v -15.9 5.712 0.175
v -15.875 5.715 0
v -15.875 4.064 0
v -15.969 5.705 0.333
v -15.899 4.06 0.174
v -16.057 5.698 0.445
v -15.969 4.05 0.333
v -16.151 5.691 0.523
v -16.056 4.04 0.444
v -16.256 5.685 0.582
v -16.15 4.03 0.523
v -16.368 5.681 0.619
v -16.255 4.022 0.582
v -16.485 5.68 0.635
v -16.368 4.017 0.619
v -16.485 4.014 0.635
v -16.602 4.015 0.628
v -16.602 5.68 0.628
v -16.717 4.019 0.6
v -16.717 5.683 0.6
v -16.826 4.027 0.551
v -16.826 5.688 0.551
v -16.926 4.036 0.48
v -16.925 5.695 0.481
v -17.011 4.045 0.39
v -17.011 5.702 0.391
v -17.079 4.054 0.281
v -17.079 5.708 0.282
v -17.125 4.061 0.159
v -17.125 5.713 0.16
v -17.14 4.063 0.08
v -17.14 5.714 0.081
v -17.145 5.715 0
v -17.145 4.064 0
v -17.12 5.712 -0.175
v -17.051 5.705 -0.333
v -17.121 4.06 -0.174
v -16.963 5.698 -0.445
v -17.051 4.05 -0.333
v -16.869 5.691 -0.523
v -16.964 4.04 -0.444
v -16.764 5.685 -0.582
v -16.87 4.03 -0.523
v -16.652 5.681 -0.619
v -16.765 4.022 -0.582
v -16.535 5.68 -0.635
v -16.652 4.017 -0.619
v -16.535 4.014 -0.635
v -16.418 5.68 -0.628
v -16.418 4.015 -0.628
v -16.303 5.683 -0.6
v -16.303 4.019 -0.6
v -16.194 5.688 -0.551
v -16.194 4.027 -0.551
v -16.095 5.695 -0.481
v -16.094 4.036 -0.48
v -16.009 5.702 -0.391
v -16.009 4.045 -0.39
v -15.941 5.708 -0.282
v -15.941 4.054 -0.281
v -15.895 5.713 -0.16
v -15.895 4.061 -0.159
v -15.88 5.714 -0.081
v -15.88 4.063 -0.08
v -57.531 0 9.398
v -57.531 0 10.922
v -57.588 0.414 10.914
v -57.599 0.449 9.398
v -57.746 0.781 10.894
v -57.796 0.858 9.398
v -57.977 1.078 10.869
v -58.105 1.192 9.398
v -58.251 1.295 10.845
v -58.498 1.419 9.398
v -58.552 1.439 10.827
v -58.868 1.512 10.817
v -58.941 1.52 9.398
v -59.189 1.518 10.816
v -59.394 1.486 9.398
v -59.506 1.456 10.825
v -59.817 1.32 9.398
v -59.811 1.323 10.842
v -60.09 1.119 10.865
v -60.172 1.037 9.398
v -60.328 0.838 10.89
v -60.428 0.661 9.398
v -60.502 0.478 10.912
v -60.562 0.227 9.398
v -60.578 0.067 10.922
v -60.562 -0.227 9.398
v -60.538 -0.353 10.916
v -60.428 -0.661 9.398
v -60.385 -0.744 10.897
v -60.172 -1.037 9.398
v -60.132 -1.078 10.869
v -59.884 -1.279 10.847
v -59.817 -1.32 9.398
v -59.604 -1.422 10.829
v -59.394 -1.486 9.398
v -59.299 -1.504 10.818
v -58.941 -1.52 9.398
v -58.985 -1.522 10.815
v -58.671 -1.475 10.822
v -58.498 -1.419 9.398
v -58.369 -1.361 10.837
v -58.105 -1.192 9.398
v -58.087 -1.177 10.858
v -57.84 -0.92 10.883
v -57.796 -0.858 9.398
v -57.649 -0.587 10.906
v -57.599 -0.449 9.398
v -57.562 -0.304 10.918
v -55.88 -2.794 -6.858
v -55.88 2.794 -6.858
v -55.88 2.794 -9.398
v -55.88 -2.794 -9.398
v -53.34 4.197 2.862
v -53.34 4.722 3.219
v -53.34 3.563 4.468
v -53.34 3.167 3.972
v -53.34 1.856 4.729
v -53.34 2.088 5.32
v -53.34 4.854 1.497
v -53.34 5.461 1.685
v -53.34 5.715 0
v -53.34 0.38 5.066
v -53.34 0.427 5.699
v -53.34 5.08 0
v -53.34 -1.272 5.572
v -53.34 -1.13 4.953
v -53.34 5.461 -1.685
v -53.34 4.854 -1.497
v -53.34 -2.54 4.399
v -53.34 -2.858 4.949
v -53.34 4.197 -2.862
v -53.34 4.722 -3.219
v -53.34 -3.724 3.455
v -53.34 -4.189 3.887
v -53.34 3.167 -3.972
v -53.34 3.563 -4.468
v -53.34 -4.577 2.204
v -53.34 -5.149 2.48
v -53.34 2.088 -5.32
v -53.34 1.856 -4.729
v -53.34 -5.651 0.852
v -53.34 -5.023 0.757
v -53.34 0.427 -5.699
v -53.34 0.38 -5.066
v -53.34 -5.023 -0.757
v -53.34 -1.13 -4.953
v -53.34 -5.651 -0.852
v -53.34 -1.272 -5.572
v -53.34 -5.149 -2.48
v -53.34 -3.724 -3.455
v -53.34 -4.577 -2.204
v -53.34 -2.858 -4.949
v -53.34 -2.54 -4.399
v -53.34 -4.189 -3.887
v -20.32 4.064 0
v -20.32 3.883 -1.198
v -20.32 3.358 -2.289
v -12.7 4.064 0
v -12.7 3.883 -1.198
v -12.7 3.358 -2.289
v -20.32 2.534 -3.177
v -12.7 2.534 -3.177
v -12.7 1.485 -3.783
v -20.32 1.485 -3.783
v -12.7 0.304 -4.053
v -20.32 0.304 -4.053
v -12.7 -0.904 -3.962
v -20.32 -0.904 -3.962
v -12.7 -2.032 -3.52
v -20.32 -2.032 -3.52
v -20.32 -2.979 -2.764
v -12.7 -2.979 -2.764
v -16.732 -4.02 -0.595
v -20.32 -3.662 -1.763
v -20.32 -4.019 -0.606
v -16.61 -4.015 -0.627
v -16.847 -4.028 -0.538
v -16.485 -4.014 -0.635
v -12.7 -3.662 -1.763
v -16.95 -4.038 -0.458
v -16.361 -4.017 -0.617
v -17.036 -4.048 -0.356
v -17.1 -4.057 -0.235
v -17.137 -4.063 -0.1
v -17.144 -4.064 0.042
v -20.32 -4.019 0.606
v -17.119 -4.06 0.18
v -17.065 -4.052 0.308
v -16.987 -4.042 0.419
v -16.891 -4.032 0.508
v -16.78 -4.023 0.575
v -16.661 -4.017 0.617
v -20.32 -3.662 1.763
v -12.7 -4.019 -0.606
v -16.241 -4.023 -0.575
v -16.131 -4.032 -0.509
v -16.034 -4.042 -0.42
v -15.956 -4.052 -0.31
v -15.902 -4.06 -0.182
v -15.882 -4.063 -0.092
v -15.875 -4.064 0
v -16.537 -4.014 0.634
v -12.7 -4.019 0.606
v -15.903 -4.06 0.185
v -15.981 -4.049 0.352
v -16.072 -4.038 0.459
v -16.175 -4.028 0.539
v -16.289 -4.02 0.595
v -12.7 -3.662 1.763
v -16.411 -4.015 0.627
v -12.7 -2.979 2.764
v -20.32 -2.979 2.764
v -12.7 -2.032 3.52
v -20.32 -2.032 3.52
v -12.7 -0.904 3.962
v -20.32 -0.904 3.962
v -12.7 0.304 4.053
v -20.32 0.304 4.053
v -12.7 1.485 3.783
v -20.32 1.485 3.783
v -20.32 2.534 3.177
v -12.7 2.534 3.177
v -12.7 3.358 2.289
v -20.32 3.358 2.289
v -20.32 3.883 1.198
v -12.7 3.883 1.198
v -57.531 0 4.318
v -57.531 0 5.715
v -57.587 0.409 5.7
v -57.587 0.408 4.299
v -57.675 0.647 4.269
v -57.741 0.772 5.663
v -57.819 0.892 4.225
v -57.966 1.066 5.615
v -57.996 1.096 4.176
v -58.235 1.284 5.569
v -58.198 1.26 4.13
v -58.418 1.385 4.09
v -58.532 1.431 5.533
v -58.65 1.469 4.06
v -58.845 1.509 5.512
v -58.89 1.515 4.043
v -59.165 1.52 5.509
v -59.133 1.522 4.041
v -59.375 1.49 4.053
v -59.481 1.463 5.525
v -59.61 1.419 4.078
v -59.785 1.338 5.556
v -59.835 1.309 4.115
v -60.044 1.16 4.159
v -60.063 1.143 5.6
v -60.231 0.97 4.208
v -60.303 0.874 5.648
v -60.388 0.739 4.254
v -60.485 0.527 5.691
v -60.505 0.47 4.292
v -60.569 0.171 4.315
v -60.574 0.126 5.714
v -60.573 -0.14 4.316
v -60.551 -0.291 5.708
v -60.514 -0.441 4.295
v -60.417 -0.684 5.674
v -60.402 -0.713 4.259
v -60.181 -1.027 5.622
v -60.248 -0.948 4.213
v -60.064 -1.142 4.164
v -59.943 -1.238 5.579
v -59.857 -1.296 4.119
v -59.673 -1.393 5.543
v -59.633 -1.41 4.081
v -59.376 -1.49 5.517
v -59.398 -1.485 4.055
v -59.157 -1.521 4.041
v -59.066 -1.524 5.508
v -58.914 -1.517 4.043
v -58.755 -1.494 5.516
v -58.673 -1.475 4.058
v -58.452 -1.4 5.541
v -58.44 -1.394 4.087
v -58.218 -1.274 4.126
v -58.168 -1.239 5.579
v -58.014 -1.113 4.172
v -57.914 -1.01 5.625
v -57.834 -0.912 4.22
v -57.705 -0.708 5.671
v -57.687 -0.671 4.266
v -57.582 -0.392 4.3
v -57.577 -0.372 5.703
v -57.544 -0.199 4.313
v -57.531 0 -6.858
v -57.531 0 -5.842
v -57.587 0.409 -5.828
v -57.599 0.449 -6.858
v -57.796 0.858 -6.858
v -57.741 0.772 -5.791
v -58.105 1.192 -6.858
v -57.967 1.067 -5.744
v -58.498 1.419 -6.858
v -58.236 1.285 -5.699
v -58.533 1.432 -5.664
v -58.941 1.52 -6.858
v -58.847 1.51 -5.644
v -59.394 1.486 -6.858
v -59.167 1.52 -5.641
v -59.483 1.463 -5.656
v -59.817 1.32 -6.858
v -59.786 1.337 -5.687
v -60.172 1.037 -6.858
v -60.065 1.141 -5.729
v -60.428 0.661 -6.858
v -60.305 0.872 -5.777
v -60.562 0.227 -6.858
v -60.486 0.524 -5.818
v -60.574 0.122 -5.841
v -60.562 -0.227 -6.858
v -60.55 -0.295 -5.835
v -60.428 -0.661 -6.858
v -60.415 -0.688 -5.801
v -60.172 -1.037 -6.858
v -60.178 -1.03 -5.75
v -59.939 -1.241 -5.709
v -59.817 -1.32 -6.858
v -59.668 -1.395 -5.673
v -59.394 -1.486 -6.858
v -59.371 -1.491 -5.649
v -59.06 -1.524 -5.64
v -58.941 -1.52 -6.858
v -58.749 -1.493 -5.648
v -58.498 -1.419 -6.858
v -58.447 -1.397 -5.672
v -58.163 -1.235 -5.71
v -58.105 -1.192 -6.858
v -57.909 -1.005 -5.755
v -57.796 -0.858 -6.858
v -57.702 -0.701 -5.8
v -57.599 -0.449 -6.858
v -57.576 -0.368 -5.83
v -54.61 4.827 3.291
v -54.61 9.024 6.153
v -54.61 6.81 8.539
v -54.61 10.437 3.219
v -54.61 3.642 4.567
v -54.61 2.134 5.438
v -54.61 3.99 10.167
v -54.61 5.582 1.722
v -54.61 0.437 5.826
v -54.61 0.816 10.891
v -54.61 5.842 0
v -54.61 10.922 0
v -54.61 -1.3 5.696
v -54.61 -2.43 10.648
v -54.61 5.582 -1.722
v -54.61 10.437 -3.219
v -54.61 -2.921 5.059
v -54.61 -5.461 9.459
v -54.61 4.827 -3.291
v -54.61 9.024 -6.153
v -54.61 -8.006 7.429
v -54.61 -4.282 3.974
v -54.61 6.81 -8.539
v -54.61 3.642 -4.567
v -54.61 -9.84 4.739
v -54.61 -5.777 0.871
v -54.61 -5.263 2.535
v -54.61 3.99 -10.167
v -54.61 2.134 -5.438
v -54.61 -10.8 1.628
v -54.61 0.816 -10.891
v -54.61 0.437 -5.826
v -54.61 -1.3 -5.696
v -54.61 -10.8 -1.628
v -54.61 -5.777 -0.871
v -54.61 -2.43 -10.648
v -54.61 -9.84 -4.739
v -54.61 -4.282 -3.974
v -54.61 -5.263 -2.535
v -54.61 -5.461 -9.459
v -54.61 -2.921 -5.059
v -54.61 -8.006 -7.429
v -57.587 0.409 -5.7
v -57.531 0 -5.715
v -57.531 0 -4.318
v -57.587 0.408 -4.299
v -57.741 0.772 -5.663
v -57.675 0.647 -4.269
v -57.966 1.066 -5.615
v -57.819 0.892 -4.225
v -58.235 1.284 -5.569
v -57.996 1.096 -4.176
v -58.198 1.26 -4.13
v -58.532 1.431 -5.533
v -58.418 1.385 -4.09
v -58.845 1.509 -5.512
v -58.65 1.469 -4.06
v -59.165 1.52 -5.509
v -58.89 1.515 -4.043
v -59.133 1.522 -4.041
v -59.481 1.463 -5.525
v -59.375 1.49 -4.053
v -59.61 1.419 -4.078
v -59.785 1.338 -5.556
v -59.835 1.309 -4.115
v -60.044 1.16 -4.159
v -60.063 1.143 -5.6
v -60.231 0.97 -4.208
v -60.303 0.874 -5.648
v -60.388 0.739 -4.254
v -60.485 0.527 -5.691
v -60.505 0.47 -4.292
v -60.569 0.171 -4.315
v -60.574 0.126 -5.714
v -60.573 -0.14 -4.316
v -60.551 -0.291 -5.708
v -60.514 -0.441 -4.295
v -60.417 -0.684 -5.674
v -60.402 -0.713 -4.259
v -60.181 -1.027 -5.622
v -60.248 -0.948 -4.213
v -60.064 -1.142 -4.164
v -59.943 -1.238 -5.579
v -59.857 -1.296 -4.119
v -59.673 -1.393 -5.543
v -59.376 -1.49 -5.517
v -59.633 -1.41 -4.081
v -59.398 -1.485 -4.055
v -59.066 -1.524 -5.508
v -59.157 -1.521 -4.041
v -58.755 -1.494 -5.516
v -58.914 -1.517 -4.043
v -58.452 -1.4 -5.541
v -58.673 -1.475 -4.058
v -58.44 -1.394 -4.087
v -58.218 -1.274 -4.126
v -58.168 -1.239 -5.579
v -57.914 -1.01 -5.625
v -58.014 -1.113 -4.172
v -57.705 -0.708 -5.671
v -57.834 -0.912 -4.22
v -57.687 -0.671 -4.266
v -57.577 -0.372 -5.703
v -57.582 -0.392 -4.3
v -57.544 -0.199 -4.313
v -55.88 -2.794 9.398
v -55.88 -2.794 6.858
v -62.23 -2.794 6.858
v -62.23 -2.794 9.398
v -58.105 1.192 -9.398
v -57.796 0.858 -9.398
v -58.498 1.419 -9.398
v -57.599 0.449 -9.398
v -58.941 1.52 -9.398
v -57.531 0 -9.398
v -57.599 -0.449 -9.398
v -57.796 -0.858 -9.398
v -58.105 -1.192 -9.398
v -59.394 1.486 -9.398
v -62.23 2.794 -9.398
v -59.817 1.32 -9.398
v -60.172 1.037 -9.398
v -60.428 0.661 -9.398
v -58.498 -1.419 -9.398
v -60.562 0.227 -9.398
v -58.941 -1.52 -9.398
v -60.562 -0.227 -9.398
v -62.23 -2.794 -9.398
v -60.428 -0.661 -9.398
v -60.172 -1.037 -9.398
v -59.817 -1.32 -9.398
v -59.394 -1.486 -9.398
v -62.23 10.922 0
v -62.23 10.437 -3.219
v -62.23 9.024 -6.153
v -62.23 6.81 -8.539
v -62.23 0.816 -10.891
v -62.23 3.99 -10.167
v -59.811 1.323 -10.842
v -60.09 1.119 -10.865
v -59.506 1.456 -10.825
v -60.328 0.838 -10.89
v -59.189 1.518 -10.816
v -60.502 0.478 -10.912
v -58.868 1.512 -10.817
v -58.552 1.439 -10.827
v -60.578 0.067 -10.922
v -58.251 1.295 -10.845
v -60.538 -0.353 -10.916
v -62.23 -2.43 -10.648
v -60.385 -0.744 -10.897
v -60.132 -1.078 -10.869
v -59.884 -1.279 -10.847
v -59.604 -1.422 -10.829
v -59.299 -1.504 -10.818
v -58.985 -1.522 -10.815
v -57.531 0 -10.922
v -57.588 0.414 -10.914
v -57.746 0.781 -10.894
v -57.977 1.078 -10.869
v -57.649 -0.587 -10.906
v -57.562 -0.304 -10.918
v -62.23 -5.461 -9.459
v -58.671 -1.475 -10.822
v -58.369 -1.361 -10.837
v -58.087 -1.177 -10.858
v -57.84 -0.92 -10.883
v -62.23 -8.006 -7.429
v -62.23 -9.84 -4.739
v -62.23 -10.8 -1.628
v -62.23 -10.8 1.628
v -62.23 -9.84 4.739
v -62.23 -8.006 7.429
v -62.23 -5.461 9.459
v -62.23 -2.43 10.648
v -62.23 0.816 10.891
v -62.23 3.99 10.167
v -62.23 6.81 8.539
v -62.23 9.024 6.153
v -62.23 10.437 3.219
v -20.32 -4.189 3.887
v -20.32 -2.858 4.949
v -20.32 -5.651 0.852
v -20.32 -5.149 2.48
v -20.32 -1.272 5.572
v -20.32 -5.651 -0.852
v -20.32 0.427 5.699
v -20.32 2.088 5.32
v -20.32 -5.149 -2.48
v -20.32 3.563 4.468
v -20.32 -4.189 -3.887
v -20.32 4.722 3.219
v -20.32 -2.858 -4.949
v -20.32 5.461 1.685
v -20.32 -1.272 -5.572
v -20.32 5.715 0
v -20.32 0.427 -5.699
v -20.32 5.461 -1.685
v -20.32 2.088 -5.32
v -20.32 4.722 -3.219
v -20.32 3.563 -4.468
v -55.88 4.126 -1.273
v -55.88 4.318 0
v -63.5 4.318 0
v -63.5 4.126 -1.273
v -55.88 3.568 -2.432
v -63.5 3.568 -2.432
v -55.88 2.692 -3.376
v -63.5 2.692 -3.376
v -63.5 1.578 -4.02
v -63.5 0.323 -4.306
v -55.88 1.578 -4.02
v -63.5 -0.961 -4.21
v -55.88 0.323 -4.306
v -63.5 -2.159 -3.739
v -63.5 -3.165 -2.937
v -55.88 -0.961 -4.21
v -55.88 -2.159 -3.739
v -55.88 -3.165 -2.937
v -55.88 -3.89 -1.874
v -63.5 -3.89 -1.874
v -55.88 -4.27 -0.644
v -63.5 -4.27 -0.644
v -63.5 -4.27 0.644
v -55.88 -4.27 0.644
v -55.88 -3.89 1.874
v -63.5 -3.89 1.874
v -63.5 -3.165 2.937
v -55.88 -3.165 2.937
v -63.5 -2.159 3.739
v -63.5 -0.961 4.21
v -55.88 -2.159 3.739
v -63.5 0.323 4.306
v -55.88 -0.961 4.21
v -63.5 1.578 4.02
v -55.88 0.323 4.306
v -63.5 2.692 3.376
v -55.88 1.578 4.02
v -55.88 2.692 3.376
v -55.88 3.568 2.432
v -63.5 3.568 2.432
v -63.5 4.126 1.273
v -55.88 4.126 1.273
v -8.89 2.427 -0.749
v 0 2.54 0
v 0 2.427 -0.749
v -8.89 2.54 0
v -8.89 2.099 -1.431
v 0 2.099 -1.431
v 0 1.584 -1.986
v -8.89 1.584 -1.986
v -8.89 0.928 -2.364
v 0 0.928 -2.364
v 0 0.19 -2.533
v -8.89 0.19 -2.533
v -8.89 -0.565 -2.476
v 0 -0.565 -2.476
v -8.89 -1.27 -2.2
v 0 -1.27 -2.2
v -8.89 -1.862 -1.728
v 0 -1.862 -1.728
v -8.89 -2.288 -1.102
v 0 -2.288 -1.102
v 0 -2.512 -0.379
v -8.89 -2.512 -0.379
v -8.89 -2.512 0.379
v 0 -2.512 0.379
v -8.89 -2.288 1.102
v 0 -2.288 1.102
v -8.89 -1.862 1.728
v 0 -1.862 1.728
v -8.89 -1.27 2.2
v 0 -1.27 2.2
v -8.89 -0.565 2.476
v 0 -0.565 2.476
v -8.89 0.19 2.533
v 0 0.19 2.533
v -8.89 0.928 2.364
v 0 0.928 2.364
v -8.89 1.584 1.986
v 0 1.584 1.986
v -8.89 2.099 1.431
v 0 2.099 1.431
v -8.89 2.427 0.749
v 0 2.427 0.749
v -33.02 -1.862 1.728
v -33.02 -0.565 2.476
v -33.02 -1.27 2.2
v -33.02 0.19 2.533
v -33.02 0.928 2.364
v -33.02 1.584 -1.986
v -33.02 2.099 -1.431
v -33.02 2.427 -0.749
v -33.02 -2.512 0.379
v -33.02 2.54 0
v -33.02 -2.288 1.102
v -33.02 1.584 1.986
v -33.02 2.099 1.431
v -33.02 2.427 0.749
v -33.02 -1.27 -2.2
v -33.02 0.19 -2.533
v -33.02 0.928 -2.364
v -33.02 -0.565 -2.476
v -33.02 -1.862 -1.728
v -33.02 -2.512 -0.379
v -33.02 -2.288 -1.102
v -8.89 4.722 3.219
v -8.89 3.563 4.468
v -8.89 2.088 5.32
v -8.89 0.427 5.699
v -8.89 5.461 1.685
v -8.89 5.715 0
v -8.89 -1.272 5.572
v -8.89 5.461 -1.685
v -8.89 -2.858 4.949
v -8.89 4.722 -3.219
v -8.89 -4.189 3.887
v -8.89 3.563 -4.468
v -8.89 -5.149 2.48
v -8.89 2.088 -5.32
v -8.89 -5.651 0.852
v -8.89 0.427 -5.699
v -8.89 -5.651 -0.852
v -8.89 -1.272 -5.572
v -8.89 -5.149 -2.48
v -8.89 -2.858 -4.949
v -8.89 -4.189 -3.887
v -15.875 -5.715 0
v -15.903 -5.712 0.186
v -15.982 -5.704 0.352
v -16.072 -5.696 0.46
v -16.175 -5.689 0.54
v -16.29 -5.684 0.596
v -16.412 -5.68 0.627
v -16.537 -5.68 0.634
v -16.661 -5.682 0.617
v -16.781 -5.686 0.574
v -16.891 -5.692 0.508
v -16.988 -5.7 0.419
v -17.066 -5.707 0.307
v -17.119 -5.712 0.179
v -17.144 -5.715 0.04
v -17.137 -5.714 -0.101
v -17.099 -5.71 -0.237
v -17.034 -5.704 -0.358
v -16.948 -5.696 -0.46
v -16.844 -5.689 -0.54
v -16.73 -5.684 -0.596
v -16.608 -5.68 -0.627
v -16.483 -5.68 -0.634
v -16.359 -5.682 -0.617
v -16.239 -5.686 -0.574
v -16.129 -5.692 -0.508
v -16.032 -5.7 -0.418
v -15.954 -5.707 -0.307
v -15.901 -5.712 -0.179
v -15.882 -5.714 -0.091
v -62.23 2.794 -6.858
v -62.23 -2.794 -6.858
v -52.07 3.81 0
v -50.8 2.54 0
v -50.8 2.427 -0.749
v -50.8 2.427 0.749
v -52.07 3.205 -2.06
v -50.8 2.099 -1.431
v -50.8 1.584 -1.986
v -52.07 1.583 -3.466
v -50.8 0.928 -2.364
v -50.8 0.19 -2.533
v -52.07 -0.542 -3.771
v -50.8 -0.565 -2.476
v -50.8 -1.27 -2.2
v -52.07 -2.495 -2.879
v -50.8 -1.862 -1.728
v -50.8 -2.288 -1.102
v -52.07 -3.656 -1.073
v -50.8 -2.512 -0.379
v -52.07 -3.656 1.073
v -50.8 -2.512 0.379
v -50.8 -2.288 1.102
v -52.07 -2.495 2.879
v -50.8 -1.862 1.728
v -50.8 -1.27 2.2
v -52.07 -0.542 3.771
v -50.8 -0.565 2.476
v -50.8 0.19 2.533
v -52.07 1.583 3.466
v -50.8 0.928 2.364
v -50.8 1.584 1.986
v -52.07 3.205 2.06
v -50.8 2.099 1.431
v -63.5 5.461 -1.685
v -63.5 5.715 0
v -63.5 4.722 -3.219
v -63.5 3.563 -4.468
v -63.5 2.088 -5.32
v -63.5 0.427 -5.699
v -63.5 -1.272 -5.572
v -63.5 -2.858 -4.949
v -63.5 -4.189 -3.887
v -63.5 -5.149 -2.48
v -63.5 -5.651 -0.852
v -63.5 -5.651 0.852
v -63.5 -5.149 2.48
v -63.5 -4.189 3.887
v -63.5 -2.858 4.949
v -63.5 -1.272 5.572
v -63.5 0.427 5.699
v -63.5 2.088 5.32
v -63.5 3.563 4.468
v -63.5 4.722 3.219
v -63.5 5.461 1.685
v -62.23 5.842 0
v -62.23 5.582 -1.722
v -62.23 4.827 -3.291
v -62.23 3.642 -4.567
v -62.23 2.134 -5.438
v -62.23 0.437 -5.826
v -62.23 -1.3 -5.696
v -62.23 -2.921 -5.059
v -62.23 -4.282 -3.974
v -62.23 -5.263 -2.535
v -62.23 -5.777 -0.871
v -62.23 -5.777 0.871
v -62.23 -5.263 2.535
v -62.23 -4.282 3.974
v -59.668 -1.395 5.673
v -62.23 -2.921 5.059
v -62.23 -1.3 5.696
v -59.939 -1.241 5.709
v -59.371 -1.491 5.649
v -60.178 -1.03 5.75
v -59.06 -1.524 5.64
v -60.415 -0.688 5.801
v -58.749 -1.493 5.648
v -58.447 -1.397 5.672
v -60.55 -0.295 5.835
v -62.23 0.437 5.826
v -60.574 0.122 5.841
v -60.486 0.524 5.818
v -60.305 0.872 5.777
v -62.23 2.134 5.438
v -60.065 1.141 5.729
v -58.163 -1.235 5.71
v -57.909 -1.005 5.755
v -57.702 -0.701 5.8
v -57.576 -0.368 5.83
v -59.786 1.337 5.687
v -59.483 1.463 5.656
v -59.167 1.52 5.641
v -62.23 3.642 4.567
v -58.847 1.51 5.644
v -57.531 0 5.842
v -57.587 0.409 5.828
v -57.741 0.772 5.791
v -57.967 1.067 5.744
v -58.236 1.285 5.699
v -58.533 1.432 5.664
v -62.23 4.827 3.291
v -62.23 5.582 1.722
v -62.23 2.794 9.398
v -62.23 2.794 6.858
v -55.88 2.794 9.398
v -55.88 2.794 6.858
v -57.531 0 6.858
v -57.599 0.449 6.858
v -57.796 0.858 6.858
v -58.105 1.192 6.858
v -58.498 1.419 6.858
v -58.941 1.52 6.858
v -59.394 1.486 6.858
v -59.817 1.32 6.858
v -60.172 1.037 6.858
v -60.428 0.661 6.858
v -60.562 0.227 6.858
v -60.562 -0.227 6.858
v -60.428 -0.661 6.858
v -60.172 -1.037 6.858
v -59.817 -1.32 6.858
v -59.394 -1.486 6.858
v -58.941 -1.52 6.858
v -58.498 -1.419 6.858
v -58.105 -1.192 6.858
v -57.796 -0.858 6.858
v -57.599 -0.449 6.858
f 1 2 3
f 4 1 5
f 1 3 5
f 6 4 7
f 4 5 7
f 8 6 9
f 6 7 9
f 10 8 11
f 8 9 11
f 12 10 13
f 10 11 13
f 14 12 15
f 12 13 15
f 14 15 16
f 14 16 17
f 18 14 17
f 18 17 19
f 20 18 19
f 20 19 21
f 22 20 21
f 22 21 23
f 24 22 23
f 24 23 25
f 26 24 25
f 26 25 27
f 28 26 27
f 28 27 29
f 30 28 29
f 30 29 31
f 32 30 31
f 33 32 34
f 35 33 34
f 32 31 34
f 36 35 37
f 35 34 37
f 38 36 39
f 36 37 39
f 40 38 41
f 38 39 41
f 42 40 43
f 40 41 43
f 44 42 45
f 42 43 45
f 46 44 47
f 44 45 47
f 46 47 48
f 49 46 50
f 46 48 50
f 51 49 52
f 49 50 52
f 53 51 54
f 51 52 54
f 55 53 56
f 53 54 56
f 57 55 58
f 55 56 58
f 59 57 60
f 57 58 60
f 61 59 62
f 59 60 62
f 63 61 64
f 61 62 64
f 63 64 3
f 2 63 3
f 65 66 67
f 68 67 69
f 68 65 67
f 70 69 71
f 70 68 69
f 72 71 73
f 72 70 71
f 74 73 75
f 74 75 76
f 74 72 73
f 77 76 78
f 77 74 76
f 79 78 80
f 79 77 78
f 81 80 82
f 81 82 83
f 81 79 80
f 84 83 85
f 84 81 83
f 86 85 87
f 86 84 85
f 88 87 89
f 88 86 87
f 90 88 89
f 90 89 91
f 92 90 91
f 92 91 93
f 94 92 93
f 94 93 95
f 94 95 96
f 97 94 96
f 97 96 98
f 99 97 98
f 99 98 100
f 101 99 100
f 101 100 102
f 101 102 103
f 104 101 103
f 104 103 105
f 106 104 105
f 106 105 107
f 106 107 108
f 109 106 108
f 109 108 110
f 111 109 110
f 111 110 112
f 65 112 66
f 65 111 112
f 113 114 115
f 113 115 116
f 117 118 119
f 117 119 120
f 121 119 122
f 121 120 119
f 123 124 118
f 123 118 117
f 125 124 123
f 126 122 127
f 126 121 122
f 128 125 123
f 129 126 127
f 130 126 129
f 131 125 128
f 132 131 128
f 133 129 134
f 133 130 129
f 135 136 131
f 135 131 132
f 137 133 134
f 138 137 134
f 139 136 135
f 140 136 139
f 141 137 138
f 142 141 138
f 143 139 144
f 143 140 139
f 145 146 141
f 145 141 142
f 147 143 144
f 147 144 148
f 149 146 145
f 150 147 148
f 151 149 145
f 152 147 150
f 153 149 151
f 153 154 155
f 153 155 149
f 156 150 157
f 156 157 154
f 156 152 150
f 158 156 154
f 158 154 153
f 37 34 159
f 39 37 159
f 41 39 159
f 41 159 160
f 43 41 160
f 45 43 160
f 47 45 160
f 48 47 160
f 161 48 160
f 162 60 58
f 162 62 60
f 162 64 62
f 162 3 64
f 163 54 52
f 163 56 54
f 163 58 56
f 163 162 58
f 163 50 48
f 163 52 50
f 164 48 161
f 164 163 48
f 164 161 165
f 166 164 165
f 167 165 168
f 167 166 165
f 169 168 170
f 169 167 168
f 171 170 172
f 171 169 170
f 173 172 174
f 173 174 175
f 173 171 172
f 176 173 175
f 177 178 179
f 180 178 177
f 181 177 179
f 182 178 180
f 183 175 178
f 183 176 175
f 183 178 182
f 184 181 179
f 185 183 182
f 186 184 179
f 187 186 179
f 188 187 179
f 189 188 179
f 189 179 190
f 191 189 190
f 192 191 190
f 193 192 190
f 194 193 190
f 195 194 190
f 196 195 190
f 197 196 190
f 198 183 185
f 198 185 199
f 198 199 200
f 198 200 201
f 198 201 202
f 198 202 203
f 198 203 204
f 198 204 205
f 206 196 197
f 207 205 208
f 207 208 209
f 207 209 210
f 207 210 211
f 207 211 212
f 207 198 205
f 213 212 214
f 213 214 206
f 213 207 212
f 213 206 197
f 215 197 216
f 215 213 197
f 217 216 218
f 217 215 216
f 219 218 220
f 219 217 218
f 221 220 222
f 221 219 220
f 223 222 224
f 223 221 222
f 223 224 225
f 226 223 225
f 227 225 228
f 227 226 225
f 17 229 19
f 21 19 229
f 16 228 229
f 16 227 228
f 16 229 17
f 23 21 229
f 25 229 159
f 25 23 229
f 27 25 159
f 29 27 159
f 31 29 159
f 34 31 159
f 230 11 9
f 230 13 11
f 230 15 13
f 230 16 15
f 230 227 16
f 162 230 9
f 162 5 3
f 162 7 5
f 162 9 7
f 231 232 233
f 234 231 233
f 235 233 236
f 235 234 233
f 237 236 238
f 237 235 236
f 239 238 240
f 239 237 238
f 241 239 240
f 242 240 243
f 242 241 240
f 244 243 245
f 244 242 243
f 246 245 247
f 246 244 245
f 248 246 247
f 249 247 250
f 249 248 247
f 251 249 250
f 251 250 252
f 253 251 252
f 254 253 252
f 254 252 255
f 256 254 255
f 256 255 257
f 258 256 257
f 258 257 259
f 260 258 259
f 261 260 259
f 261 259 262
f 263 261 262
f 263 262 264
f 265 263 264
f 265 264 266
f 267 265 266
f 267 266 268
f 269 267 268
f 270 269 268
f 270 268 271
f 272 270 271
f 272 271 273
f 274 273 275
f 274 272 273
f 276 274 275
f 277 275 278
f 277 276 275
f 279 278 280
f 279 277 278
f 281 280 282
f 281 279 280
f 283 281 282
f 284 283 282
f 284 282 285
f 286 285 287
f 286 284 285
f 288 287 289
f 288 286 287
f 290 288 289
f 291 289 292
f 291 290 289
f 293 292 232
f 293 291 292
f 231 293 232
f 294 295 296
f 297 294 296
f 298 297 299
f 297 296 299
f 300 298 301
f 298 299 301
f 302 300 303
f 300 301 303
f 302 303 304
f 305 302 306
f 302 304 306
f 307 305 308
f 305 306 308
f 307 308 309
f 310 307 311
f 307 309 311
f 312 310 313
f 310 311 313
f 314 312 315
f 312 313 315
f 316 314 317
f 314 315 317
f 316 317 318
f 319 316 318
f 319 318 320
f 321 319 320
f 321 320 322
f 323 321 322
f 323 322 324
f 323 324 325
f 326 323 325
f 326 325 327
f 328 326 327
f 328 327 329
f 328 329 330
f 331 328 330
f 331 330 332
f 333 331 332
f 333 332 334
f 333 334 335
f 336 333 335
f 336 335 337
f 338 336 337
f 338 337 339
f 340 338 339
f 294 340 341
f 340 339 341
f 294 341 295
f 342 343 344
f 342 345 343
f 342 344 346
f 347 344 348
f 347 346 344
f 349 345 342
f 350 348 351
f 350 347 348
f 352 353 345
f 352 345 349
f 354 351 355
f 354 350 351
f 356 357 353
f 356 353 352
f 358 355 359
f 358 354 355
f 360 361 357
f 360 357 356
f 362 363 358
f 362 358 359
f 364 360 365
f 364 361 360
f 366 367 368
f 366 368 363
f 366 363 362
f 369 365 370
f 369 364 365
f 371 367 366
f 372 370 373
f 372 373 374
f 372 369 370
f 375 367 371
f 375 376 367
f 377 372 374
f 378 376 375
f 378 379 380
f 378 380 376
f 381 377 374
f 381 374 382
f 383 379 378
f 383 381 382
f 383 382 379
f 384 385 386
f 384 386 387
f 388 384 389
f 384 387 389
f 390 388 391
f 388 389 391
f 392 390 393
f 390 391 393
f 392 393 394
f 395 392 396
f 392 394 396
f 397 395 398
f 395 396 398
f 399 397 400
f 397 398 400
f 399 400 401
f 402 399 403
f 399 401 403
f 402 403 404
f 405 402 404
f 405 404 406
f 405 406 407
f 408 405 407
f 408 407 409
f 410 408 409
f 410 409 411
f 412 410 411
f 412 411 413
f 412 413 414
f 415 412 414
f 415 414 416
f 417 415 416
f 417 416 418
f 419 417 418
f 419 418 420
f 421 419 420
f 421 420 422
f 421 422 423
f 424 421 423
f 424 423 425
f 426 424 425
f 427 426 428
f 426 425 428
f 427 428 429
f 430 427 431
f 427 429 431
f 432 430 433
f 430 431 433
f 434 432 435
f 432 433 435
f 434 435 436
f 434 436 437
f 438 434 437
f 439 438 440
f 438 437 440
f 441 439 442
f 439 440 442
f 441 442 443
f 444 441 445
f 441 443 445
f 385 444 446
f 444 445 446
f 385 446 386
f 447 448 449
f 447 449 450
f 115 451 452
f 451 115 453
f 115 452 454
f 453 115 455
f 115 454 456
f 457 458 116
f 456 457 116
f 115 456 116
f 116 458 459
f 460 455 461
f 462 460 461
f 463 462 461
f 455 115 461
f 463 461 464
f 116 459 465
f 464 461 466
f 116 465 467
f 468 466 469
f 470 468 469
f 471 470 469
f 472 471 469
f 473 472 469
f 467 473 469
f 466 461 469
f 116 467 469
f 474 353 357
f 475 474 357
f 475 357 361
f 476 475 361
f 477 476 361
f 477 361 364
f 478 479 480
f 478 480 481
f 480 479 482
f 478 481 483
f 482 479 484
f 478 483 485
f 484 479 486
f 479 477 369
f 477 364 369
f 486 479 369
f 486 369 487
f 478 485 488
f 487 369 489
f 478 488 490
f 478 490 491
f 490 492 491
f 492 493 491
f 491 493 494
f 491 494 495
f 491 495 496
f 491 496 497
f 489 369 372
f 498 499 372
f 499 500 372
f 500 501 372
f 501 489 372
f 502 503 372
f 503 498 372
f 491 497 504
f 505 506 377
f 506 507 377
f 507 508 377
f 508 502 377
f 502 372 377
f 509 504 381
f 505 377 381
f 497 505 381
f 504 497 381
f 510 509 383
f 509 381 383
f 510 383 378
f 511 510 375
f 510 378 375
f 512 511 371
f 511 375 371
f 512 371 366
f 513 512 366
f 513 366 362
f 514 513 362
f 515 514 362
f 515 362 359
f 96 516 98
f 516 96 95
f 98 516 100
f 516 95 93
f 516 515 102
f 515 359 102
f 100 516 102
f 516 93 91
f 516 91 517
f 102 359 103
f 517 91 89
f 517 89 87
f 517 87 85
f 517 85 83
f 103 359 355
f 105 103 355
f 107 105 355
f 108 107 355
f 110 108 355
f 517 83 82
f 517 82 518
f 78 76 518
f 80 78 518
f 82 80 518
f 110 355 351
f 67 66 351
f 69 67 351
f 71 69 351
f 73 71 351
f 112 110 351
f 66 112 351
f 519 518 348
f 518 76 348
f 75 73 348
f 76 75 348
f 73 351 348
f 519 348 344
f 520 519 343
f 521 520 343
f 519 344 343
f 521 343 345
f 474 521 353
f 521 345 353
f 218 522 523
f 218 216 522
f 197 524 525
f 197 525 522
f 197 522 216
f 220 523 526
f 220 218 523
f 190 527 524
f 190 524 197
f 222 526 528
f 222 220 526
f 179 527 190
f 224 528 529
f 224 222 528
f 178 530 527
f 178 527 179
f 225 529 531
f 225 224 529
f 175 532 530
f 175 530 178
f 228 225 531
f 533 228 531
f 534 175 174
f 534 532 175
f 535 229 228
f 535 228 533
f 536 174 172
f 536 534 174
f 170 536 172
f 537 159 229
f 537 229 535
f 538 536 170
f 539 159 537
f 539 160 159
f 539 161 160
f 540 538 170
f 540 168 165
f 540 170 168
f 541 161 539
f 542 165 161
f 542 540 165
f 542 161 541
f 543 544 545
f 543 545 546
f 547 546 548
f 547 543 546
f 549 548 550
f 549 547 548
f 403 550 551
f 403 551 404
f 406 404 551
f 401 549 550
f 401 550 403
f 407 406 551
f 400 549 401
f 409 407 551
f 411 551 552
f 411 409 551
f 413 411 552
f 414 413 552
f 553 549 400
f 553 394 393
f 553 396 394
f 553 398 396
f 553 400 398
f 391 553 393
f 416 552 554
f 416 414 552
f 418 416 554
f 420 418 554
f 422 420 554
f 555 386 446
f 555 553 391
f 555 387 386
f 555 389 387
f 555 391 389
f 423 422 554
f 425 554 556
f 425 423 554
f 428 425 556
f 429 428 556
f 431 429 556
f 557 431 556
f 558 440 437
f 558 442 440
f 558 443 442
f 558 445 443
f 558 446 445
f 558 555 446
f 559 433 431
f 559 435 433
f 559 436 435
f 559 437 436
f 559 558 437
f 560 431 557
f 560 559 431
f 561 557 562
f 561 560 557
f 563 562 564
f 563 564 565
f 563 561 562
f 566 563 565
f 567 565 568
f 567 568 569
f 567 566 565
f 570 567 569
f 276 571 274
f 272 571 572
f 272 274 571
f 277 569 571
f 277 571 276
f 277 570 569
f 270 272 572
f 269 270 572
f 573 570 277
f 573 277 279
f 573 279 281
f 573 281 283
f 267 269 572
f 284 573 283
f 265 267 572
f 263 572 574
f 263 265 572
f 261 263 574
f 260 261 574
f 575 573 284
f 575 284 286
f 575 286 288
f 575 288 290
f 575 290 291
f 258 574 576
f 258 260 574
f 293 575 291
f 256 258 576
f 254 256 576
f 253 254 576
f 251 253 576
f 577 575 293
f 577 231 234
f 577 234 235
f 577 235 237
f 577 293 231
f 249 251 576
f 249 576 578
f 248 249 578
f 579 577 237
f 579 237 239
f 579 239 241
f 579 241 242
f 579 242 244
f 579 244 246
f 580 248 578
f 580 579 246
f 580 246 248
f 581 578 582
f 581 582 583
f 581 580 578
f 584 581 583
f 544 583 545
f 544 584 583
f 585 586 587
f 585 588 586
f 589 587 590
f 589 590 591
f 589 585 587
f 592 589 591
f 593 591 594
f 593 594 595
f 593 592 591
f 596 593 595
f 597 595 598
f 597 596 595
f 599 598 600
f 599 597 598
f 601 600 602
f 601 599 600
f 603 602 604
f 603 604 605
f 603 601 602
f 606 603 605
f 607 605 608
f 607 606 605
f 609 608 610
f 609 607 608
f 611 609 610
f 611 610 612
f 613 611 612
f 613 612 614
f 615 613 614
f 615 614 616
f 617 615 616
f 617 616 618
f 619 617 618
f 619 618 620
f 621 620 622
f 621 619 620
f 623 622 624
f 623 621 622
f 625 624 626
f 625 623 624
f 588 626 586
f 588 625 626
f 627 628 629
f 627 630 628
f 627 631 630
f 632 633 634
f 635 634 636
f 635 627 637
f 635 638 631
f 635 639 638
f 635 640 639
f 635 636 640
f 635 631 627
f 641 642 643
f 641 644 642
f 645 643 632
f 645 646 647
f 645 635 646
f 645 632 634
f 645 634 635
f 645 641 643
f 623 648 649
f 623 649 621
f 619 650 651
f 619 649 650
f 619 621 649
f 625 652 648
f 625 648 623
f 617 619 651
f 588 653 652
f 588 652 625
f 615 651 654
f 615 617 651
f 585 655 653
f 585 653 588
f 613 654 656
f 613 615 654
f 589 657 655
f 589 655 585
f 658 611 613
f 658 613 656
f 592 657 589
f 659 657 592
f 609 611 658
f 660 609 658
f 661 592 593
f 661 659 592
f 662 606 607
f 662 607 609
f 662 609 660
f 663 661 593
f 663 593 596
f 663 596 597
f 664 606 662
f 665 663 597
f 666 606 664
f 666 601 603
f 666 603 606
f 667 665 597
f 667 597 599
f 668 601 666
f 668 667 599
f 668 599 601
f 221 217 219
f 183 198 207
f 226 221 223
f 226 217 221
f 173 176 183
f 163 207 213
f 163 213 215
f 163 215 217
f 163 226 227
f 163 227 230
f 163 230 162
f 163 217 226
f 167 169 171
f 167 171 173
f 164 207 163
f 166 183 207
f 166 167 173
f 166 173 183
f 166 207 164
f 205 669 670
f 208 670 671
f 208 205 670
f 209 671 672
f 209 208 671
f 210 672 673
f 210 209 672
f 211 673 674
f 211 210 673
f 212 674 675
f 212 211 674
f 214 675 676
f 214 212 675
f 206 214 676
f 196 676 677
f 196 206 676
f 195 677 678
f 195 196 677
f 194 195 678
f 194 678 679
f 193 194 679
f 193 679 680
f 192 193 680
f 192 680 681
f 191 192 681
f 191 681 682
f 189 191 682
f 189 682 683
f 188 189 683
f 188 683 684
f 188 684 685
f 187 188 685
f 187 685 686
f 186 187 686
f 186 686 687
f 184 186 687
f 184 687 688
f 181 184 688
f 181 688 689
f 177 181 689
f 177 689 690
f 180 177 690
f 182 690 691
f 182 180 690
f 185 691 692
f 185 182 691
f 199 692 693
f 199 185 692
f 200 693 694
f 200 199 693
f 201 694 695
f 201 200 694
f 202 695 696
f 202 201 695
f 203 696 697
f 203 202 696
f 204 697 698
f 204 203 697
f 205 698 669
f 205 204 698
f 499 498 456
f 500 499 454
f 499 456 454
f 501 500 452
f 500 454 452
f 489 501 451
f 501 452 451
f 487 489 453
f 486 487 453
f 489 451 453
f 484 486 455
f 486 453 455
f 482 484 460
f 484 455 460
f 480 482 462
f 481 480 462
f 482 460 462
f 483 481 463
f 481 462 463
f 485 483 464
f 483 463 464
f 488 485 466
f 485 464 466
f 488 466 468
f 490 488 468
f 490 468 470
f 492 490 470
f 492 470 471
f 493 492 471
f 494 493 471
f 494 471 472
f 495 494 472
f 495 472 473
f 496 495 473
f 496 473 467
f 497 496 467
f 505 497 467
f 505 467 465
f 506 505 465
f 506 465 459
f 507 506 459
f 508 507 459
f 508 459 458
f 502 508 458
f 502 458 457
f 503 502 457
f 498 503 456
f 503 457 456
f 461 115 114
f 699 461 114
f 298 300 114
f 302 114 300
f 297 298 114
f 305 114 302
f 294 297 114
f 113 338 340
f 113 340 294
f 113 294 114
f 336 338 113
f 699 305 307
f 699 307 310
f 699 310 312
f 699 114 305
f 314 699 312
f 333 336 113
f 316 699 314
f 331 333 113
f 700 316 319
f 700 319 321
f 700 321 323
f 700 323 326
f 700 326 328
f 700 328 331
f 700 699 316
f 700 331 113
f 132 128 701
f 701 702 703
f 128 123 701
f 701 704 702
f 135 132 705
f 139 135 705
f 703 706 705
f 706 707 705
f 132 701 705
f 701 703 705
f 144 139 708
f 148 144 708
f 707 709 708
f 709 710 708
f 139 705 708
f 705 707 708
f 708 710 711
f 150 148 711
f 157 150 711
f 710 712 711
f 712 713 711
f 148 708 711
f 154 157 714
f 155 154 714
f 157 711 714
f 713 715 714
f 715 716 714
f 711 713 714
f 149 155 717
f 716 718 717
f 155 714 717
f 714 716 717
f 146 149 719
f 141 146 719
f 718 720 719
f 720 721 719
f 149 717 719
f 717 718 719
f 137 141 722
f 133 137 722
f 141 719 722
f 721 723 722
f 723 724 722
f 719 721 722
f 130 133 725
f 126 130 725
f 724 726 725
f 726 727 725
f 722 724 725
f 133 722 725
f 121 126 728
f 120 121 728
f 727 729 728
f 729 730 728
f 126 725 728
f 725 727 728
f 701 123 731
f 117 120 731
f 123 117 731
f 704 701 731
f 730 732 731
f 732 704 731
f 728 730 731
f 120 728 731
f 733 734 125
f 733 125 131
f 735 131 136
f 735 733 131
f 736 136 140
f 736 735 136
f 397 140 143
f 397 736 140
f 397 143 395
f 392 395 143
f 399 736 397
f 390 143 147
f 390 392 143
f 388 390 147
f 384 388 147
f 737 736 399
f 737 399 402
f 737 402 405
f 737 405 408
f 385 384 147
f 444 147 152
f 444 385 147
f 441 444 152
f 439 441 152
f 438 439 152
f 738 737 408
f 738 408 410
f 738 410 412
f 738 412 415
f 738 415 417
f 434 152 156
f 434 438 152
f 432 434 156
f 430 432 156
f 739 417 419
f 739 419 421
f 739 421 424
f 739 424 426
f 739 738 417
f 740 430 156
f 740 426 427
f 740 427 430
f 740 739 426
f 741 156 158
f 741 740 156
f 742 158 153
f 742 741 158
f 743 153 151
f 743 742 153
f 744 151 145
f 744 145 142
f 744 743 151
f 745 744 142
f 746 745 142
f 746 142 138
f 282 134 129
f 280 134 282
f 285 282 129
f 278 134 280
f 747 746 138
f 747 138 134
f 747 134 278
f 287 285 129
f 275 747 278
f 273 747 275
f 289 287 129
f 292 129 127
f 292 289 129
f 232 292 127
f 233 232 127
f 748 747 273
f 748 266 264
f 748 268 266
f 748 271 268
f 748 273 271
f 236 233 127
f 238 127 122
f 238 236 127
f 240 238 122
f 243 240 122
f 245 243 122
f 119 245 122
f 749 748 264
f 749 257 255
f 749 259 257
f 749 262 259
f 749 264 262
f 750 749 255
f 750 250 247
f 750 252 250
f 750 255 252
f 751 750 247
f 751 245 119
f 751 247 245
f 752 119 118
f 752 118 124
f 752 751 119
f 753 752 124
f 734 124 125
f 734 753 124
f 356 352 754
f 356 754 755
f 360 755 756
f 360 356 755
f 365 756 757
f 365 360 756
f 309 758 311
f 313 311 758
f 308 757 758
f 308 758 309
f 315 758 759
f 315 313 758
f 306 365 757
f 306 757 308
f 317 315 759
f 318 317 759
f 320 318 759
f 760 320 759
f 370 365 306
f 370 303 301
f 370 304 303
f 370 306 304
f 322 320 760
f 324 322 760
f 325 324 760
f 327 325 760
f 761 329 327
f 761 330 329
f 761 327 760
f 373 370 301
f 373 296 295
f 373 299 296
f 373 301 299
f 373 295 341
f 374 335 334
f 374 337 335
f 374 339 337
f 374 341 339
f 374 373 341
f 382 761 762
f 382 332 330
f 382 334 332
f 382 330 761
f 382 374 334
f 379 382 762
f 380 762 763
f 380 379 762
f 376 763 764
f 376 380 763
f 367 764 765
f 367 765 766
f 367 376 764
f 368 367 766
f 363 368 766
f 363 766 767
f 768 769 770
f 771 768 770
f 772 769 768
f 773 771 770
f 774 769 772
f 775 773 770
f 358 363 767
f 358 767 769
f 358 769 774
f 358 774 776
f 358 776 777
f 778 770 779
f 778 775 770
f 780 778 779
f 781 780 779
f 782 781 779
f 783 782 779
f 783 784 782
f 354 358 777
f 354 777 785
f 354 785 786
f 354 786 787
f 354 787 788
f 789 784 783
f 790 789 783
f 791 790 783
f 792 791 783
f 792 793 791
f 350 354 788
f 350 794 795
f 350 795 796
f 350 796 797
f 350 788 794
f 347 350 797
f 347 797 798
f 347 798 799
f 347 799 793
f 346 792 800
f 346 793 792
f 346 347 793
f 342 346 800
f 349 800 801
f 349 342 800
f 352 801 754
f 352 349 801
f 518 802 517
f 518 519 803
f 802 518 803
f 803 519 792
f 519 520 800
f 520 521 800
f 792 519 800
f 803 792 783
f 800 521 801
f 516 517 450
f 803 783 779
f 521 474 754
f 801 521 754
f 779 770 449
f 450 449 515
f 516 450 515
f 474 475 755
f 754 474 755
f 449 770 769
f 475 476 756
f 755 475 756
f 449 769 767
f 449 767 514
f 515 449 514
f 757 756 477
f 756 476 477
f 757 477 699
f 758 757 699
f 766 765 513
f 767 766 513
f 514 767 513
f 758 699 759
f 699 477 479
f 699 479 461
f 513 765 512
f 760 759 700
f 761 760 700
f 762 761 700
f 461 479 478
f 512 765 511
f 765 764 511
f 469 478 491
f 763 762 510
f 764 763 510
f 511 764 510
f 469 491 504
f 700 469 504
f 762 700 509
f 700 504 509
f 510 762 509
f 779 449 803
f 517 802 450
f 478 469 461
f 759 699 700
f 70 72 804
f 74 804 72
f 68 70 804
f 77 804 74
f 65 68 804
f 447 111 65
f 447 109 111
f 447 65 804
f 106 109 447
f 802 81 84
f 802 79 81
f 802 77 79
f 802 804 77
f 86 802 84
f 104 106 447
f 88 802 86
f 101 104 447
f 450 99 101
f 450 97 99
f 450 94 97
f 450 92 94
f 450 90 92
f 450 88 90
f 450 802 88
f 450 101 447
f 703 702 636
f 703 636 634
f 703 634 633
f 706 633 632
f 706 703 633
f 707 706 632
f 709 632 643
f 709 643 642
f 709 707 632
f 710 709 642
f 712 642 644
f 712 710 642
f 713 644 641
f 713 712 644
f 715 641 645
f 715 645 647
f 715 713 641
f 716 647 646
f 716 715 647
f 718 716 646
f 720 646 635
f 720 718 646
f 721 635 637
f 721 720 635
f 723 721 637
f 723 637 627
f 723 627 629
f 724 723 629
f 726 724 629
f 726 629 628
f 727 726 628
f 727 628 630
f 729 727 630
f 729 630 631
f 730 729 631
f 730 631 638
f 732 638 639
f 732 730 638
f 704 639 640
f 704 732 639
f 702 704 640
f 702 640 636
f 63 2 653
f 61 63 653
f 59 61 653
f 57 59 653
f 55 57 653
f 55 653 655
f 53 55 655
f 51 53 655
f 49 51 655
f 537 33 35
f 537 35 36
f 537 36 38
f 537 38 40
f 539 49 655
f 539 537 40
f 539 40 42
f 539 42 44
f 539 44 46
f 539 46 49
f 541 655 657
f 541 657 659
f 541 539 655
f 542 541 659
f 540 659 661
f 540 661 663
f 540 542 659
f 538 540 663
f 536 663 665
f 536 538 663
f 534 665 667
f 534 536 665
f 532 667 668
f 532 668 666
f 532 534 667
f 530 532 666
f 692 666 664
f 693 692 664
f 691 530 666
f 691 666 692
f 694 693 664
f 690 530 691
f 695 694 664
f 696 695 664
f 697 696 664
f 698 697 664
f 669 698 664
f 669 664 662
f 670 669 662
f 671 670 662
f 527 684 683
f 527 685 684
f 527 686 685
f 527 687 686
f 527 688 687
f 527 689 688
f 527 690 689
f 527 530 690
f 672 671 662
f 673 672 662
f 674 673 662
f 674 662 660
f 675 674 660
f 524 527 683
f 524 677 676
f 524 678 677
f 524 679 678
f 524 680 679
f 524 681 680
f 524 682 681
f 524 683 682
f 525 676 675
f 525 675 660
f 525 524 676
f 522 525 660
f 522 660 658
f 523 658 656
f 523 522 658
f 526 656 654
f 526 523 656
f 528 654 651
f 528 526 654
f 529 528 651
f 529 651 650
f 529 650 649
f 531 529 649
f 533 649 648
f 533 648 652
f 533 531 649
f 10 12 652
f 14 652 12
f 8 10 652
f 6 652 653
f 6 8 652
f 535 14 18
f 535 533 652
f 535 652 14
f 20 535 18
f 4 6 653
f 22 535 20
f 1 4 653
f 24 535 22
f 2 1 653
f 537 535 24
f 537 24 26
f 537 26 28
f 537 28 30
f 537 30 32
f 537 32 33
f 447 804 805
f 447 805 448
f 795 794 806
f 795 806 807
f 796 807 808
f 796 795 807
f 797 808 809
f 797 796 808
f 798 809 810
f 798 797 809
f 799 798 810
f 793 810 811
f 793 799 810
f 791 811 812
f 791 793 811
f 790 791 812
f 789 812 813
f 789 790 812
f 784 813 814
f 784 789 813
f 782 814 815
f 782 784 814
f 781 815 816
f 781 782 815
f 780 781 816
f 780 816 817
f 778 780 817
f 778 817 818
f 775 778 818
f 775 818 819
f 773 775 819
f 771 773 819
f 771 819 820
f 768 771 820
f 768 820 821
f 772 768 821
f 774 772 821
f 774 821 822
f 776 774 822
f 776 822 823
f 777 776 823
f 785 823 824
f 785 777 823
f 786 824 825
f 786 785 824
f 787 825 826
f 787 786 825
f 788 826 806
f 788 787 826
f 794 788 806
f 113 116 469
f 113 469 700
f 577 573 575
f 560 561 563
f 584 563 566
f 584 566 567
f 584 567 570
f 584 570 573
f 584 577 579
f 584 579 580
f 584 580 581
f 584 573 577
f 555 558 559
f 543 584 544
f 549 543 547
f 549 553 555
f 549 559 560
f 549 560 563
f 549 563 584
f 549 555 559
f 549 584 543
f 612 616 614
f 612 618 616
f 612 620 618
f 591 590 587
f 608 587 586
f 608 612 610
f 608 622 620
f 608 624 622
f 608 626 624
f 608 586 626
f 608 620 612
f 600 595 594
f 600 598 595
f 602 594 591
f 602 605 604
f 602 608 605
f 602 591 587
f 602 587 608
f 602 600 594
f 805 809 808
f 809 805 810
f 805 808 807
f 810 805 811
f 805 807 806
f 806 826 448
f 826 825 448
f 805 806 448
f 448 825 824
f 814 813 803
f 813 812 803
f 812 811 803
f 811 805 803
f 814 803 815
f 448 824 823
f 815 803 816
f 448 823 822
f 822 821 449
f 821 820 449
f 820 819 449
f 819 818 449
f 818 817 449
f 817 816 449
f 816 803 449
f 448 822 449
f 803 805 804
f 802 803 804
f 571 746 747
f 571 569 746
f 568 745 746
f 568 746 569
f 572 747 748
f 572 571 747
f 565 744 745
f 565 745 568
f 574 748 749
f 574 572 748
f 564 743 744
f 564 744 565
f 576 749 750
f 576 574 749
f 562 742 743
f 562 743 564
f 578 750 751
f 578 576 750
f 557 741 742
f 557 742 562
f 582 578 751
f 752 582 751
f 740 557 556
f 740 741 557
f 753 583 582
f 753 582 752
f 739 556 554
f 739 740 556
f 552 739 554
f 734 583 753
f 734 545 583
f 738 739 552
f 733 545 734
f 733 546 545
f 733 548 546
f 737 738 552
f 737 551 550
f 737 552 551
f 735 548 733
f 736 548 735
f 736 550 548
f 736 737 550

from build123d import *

# Parameters (mm, degrees)
F2_R           = 0.635
F3_DEPTH       = 5.716
F4_DEPTH       = 5.7160001
F5_SIZE        = 2.54
F0_W           = 7.62
F0_H           = 5.08
F7_W           = 5.588
F7_H           = 2.54
F8_DEPTH       = 6.35
F9_R           = 1.524
F10_DEPTH      = 10.923
F10_DEPTH_BACK = 10.923


with BuildPart() as f1:
    # F0 (on Top) → F1 (revolve)
    with BuildSketch(Plane.XY):
        Polygon((-8.89, 5.715), (-20.32, 5.715), (-20.32, 4.064), (-12.7, 4.064), (-12.7, 0), (0, 0), (0, 2.54), (-8.89, 2.54), align=None)
    revolve(axis=Axis((-12.0637848582, 0, 0), (-1, 0, 0)))

    # F2 (on Front) → F3 (cut, through all)
    with BuildSketch(Plane.XZ):
        with Locations((-16.51, 0)):
            Circle(F2_R)
    extrude(amount=-F3_DEPTH, mode=Mode.SUBTRACT)

    # F2 (on Front) → F4 (cut, through all)
    with BuildSketch(Plane.XZ):
        with Locations((-16.51, 0)):
            Circle(F2_R)
    extrude(amount=F4_DEPTH, mode=Mode.SUBTRACT)


with BuildPart() as f1b:
    # F0 (on Top) → F1, piece 2 (revolve)
    with BuildSketch(Plane.XY):
        Polygon((-53.34, 2.54), (-53.34, 5.715), (-63.5, 5.715), (-63.5, 4.318), (-55.88, 4.318), (-55.88, 0), (-33.02, 0), (-33.02, 2.54), align=None)
    revolve(axis=Axis((-12.0637848582, 0, 0), (-1, 0, 0)))

    # F5
    f5_edges = [f1b.edges().sort_by_distance(p)[0] for p in [
        (-53.34, -2.54, 0),
    ]]
    chamfer(f5_edges, length=F5_SIZE)


with BuildPart() as f6:
    # F0 (on Top) → F6 (revolve)
    with BuildSketch(Plane.XY):
        with Locations((-58.42, 8.382)):
            Rectangle(F0_W, F0_H)
    revolve(axis=Axis((-12.0637848582, 0, 0), (-1, 0, 0)))

    # F7 (on face) → F8 (cut)
    with BuildSketch(Plane(origin=(-62.23, 0, 0), x_dir=(0, -1, 0), z_dir=(-1, 0, 0))):
        with Locations((0, 8.128)):
            Rectangle(F7_W, F7_H)
        with Locations((0, -8.128)):
            Rectangle(F7_W, F7_H)
    extrude(amount=-F8_DEPTH, mode=Mode.SUBTRACT)


with BuildPart() as f10_tool:
    # F9 (on Top) → F10 (new body, two sides)
    with BuildSketch(Plane.XY) as f10_sk:
        with Locations((-59.055, 0)):
            Circle(F9_R)
    extrude(amount=-F10_DEPTH)
    extrude(f10_sk.sketch, amount=F10_DEPTH_BACK)


with BuildPart() as f1b_1:
    add(f1b.part)

    # F10: cut by f10_tool
    add(f10_tool.part, mode=Mode.SUBTRACT)


with BuildPart() as f6_1:
    add(f6.part)

    # F10: cut by f10_tool
    add(f10_tool.part, mode=Mode.SUBTRACT)


solid = Compound([f1.part, f1b_1.part, f6_1.part])
